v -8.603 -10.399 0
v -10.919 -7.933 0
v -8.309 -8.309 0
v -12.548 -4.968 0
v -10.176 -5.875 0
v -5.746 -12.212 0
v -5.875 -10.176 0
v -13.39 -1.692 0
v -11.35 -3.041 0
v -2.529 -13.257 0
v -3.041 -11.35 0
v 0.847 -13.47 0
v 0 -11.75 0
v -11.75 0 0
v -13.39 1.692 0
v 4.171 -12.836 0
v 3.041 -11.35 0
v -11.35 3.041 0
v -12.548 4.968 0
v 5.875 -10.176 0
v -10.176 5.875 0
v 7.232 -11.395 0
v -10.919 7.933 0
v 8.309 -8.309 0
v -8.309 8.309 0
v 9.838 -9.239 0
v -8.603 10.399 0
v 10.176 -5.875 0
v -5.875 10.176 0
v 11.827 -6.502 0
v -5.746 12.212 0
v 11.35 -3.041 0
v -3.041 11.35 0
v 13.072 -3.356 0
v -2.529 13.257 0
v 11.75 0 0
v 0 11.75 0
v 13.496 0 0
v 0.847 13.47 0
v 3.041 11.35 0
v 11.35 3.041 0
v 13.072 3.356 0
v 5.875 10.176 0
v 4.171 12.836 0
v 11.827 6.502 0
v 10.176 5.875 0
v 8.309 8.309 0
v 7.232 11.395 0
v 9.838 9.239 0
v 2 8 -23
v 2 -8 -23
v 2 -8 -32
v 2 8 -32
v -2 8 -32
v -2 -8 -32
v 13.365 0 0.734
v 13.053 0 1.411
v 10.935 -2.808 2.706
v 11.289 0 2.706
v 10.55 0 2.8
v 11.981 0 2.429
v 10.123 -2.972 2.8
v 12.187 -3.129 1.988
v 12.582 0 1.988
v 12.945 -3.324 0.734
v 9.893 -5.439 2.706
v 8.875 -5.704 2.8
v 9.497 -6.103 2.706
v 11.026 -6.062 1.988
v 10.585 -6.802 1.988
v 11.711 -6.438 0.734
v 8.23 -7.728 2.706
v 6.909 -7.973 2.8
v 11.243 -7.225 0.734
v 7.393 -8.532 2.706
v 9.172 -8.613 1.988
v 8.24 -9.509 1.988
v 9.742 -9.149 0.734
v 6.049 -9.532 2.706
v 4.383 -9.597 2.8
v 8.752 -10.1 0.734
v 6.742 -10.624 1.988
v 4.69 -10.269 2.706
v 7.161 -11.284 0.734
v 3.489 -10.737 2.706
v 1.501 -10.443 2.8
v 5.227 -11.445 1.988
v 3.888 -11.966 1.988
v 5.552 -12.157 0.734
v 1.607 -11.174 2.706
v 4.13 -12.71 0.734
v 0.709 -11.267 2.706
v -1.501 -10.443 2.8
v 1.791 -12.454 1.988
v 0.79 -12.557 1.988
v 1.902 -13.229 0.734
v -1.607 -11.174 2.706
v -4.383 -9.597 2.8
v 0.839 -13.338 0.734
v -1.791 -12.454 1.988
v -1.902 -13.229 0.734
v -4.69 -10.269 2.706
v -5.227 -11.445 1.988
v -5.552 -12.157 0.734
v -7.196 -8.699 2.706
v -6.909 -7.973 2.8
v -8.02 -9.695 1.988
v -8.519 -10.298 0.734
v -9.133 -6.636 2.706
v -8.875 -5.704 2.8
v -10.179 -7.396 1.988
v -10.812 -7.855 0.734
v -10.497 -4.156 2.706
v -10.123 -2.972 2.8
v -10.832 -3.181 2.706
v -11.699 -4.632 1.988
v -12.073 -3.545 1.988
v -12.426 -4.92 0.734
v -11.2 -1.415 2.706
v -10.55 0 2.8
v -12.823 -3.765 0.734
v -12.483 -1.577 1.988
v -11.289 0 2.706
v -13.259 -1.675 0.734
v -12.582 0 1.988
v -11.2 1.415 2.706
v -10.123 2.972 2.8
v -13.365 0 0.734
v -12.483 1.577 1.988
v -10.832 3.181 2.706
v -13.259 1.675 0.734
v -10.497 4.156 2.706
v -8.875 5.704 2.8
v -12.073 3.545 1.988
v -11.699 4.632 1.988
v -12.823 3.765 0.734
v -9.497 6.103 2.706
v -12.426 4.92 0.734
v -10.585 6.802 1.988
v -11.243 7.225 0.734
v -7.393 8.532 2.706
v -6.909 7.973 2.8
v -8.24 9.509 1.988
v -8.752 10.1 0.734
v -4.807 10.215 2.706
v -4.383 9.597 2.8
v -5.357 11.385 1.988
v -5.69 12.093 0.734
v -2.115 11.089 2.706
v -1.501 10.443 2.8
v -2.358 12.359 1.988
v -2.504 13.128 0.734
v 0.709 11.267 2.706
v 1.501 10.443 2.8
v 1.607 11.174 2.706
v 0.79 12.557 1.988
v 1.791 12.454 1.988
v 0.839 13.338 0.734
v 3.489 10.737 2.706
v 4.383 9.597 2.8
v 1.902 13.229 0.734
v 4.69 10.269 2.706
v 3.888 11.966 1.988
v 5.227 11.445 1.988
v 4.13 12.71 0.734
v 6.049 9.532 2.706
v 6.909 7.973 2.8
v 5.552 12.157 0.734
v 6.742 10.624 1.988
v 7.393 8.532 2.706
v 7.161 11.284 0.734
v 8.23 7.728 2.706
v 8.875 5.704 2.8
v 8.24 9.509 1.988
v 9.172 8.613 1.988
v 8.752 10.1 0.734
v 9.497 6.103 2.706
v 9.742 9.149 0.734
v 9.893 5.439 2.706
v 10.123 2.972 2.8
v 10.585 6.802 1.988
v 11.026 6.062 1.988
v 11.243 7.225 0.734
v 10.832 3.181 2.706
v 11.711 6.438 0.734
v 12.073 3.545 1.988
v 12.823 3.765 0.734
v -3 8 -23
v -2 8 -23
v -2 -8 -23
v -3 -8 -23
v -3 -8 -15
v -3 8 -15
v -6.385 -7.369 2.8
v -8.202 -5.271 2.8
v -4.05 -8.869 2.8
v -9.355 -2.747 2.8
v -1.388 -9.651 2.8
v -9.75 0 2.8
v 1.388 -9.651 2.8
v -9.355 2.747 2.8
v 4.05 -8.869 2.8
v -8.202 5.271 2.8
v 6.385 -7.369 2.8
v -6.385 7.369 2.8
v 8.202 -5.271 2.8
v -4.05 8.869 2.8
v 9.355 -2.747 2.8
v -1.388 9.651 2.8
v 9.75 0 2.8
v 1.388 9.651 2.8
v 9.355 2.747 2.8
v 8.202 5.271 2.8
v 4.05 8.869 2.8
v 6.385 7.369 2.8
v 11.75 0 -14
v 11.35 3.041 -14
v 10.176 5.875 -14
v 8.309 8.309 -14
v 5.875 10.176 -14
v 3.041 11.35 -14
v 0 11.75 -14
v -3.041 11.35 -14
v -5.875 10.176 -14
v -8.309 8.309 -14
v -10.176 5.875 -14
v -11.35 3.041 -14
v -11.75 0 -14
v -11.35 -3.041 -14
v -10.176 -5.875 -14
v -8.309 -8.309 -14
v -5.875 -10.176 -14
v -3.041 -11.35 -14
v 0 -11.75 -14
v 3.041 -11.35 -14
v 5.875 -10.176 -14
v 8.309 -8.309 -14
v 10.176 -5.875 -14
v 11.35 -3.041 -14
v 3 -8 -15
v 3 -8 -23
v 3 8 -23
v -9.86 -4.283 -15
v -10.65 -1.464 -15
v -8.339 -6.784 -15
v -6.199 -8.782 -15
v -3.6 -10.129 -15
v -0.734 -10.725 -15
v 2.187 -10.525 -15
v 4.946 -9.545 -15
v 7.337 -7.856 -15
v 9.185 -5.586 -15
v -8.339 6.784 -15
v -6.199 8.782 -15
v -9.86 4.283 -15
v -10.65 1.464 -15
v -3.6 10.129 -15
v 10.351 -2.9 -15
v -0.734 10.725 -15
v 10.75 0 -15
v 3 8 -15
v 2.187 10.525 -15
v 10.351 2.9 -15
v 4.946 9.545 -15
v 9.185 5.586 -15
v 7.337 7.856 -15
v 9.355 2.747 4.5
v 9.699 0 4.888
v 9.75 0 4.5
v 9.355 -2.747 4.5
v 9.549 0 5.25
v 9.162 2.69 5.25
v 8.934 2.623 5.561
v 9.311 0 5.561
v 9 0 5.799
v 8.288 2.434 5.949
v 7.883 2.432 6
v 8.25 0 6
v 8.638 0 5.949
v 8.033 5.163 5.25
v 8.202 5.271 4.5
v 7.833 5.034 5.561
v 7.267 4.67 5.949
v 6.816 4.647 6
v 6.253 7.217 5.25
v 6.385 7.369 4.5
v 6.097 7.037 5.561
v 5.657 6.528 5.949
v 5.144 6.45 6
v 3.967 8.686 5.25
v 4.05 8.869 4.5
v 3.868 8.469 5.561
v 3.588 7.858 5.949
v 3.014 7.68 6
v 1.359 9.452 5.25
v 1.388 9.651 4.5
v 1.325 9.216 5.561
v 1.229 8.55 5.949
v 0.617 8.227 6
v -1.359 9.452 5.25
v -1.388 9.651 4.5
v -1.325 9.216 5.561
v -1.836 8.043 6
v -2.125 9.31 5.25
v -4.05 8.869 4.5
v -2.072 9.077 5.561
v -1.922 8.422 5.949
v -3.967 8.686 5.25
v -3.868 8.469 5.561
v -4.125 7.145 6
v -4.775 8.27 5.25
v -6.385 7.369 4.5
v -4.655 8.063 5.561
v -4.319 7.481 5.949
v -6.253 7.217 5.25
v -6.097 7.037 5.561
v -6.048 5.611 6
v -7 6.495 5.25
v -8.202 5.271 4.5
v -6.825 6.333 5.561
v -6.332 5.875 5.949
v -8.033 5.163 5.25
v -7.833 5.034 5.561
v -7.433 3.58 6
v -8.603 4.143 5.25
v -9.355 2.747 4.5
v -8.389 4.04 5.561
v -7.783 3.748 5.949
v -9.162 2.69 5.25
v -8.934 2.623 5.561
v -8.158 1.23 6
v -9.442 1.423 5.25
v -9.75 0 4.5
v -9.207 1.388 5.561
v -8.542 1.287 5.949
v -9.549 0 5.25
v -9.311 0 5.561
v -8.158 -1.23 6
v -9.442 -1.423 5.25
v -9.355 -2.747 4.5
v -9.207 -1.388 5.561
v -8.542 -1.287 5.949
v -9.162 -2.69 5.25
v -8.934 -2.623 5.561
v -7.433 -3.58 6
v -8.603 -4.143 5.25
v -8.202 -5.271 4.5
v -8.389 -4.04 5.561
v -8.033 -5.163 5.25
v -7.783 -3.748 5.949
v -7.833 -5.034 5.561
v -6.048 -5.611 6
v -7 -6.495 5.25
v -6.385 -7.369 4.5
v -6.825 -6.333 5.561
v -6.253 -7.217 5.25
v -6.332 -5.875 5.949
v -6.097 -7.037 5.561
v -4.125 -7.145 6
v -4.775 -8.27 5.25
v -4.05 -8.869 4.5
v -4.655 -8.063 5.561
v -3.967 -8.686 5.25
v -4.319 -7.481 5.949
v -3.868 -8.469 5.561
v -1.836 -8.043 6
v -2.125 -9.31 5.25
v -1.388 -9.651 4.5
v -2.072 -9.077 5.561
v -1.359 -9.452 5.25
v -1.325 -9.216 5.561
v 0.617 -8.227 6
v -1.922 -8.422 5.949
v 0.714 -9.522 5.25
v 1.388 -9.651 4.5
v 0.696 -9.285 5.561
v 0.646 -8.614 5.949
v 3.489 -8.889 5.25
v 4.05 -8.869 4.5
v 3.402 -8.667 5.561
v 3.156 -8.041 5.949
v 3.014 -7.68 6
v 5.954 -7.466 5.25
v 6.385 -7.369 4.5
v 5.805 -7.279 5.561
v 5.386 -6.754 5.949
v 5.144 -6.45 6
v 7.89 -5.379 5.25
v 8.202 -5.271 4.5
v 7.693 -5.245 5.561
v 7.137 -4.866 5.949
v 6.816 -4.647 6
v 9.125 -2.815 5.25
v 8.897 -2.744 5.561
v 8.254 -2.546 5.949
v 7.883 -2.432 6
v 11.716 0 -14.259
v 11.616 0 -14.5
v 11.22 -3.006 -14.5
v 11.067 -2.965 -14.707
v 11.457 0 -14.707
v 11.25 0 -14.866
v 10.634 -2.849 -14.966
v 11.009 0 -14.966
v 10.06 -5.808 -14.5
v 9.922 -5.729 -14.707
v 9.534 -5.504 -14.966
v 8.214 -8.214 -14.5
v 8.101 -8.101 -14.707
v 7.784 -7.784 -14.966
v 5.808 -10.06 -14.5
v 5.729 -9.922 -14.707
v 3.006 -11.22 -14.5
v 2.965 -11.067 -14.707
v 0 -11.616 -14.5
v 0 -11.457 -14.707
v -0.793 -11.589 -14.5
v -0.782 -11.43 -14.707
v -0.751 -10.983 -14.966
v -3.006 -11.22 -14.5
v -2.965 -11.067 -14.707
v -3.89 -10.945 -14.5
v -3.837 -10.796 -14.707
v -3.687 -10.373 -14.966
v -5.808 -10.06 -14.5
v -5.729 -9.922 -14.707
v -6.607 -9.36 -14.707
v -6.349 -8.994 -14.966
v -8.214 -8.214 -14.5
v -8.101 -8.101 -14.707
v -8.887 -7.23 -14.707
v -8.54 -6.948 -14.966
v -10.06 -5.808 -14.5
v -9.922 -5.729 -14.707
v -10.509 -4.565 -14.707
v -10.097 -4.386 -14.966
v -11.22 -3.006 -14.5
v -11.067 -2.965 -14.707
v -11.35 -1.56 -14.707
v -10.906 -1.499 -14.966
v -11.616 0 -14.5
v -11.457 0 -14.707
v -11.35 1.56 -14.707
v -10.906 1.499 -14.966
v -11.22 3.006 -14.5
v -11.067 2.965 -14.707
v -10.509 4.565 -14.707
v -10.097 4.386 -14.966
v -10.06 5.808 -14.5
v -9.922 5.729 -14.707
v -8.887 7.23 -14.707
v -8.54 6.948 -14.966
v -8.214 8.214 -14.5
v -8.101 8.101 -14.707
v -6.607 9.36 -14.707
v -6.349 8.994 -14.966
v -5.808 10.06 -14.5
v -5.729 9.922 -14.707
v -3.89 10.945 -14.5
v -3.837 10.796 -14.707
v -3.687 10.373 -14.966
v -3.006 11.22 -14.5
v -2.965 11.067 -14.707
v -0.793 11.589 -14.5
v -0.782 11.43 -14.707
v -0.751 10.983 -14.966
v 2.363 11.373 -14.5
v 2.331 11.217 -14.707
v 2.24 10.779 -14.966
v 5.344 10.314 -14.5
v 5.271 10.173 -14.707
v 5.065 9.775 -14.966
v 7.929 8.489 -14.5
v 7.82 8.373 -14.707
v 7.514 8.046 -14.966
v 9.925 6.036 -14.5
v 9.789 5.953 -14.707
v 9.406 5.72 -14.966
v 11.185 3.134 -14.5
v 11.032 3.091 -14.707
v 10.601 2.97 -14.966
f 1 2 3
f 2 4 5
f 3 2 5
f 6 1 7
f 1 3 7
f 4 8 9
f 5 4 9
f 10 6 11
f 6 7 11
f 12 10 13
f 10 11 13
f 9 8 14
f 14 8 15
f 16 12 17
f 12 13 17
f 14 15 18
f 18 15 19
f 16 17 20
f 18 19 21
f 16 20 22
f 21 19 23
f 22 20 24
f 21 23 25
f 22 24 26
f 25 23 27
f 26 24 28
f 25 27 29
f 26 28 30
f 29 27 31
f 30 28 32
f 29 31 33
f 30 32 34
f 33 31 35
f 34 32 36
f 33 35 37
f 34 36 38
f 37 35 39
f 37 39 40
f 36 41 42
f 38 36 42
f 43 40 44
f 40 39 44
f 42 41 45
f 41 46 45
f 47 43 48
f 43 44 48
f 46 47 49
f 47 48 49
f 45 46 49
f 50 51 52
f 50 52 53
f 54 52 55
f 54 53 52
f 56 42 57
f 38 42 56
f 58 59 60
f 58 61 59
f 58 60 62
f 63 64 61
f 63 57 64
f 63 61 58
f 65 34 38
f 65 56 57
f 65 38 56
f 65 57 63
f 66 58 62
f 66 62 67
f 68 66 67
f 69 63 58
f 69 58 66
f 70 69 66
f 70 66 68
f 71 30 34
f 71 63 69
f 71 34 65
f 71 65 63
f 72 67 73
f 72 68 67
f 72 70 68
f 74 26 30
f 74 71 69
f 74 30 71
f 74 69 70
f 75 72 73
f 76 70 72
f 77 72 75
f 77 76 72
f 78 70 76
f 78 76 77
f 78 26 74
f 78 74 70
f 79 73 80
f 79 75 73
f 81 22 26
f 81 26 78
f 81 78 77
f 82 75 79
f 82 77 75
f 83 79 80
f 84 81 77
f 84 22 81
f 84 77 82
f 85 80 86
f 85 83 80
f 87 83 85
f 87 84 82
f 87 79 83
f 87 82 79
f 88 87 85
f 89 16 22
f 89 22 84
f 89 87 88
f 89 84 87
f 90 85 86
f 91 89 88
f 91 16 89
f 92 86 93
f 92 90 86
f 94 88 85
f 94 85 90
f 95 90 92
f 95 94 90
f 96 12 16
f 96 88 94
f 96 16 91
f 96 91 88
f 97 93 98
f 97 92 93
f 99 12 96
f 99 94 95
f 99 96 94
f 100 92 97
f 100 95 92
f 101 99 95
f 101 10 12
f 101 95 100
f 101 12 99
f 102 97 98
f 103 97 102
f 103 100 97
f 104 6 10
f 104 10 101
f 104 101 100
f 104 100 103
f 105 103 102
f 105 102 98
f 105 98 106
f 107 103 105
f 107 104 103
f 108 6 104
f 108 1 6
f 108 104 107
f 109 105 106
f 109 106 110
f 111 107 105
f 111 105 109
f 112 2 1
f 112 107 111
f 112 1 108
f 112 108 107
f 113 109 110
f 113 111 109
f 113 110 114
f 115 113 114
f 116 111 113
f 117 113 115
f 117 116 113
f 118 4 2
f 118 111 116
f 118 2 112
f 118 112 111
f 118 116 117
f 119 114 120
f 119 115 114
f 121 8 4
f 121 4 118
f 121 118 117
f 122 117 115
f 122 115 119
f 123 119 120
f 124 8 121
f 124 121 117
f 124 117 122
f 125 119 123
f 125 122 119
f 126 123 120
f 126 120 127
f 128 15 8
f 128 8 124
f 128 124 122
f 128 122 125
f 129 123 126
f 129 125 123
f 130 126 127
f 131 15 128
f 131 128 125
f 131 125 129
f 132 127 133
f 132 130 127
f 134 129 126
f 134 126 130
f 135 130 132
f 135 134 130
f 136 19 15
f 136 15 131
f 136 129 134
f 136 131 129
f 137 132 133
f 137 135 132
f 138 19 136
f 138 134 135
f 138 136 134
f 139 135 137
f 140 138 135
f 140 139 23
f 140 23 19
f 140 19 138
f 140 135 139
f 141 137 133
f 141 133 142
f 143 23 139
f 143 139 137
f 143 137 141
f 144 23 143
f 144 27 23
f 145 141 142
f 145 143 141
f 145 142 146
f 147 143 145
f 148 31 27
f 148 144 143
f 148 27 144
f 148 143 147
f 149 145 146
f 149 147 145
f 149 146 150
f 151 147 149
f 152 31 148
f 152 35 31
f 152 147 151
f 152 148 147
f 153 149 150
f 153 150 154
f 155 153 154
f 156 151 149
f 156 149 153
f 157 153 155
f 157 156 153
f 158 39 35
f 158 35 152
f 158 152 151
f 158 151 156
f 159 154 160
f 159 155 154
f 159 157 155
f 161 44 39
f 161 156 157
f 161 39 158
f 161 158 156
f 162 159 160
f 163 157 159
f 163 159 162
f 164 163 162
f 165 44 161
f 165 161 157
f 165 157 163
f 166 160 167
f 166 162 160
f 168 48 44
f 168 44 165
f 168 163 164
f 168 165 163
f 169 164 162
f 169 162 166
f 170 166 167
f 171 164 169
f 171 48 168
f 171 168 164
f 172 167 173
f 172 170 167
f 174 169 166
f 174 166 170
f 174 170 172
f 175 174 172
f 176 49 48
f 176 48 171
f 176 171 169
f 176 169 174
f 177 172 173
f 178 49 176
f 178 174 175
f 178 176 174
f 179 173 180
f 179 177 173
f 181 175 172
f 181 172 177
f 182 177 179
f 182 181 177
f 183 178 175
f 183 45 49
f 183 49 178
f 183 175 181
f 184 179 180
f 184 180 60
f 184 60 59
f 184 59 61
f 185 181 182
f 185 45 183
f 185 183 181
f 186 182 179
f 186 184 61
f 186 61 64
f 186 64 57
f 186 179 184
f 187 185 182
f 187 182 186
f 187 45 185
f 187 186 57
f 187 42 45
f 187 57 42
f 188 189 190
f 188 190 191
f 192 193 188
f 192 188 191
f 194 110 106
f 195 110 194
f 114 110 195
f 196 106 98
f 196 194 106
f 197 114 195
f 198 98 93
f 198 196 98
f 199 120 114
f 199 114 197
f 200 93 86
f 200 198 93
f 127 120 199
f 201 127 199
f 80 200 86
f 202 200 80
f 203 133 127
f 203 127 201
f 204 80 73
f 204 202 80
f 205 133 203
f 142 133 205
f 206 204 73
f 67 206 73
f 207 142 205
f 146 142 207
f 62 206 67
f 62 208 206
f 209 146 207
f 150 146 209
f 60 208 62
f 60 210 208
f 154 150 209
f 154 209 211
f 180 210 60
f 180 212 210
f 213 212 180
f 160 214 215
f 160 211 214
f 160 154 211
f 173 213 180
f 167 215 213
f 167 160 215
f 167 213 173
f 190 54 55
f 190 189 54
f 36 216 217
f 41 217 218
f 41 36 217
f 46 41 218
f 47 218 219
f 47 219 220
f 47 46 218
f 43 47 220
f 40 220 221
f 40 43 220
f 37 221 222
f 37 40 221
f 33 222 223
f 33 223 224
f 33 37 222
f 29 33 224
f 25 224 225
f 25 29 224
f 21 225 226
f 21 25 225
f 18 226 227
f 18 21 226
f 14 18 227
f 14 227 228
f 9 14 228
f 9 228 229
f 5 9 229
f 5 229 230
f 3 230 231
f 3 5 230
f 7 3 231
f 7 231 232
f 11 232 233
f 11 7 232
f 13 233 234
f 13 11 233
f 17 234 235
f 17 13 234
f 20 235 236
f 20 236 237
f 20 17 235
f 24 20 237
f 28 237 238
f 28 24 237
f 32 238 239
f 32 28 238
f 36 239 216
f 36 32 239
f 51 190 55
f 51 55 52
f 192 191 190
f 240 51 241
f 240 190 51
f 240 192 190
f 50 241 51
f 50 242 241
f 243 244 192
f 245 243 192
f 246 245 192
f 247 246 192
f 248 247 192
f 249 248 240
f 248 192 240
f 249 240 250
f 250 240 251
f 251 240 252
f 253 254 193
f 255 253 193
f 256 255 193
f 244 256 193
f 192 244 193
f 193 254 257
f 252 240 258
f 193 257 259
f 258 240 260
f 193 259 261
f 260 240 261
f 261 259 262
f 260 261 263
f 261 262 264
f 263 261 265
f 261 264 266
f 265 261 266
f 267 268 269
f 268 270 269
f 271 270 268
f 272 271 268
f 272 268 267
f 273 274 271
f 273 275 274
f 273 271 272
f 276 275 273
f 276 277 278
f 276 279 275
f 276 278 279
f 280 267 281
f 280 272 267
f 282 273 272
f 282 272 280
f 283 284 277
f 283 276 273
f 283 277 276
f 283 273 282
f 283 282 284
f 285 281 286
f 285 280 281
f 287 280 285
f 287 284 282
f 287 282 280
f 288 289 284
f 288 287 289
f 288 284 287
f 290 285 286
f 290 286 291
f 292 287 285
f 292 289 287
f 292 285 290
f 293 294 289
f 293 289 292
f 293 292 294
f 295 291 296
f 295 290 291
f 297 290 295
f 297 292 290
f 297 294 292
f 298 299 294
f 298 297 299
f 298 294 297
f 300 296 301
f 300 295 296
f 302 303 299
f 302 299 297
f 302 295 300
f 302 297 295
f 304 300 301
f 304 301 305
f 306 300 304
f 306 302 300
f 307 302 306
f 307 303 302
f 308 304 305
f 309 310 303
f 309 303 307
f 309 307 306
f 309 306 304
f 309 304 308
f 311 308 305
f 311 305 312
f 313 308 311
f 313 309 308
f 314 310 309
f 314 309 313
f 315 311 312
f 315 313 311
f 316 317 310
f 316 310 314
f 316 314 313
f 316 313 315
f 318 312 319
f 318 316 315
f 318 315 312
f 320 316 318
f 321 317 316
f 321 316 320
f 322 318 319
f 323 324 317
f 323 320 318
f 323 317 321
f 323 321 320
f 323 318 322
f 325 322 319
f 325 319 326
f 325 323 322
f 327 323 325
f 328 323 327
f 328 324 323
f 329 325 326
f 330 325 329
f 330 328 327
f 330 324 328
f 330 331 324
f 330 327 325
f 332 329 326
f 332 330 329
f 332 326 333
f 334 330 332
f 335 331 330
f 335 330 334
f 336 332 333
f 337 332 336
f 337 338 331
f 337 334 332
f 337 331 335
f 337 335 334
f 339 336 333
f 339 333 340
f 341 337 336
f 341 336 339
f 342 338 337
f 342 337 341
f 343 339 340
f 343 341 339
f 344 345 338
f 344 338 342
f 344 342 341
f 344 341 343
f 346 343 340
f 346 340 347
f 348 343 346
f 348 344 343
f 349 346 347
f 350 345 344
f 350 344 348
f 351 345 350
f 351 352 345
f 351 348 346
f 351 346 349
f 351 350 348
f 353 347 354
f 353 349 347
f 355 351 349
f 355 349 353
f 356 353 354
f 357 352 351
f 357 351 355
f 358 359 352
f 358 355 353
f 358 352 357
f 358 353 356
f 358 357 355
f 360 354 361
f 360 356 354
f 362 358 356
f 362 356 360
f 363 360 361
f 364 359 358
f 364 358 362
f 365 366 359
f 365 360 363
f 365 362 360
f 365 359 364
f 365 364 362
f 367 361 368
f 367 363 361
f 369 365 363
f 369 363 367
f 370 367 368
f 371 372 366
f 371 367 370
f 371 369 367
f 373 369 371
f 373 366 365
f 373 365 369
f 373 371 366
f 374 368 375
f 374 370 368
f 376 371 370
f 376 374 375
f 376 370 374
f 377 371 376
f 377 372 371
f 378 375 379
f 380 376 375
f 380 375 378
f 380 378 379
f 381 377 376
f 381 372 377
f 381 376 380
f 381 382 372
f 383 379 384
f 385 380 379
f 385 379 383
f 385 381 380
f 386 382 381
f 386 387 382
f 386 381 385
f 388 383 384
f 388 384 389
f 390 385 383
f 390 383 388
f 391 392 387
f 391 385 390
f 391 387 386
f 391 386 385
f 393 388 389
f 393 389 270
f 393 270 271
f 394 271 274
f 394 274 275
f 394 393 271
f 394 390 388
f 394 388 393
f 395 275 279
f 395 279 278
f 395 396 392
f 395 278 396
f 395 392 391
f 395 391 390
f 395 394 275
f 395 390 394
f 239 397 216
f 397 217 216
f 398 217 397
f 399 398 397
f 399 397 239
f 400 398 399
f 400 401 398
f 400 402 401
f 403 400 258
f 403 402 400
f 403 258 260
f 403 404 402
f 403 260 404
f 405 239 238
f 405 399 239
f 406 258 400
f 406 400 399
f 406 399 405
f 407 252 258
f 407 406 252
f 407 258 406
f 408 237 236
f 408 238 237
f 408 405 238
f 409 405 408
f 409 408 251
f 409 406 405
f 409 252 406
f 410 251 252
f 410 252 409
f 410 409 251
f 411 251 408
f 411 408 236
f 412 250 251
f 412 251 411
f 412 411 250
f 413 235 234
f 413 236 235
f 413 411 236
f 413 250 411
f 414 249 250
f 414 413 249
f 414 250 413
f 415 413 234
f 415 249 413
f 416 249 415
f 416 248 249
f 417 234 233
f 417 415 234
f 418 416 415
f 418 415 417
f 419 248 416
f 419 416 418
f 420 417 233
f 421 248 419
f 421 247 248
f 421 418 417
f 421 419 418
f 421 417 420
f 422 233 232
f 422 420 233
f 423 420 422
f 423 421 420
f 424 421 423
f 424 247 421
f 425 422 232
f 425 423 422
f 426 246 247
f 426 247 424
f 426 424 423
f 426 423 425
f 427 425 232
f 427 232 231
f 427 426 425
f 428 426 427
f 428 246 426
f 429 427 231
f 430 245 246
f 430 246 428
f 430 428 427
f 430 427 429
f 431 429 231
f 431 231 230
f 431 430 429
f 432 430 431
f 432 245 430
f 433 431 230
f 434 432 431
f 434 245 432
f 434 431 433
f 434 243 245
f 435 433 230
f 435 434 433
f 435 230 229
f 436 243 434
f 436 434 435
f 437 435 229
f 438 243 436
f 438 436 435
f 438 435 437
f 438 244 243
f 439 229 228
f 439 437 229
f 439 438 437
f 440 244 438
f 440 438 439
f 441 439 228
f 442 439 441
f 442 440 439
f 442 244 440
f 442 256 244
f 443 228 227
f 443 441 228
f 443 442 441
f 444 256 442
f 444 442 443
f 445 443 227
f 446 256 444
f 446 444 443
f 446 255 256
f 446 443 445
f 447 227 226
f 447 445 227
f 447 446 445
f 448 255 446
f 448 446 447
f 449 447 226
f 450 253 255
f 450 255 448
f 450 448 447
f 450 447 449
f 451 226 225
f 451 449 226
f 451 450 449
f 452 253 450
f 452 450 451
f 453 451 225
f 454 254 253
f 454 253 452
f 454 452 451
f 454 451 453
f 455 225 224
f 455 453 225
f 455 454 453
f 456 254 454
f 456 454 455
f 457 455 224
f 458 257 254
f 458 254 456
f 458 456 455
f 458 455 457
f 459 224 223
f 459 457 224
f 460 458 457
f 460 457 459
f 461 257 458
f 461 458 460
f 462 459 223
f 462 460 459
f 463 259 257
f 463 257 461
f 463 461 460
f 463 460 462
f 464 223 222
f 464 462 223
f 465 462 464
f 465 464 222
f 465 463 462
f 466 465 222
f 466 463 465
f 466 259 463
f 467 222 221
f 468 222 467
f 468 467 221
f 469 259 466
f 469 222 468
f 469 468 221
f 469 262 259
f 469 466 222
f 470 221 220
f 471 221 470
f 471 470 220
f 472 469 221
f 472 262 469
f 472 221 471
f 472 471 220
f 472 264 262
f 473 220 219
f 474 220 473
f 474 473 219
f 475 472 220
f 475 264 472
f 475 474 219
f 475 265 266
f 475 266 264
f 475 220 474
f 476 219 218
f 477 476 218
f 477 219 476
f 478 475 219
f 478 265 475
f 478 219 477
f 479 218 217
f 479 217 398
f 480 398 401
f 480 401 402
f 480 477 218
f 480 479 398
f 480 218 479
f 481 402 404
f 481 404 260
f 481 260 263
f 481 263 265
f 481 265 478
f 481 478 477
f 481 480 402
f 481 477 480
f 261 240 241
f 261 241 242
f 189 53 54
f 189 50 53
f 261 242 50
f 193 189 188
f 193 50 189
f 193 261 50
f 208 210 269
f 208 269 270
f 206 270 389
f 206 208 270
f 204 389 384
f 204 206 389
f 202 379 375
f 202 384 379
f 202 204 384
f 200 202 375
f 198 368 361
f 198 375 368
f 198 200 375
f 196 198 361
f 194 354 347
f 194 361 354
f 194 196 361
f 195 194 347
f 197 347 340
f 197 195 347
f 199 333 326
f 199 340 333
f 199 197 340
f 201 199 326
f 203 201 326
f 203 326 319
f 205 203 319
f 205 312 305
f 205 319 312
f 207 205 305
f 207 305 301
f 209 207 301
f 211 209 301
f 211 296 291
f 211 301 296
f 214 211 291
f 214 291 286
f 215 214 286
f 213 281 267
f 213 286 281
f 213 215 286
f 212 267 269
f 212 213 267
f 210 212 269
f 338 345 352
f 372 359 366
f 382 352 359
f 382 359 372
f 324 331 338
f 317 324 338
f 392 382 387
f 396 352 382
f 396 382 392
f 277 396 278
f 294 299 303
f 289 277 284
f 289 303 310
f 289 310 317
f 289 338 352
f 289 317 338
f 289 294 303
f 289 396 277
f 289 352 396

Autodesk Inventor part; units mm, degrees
ref_plane "YZ Plane" through (0, 0, 0) normal (1, 0, 0) x (0, 1, 0)
ref_plane "XZ Plane" through (0, 0, 0) normal (0, 1, 0) x (-1, 0, 0)
ref_plane "XY Plane" through (0, 0, 0) normal (0, 0, 1) x (1, 0, 0)
sketch "Sketch1" plane through (0, 0, 0) normal (0, 0, 1) x (1, 0, 0)
  circle A0 centre (0, 0) radius 11.75
  dimension "d0" = 23.5
extrude "Extrusion1" add sketch "Sketch1" against normal blind 15
sketch "Sketch2" plane through (0, 0, 0) normal (0, 0, 1) x (1, 0, 0)
  circle A0 centre (0, 0) radius 11.75 projected
  circle A1 centre (0, 0) radius 13.5
  dimension "d3" = 27
extrude "Extrusion2" add sketch "Sketch2" along normal blind 2.8 contours A0 | A1
sketch "Sketch3" plane through (0, 0, 2.8) normal (0, 0, 1) x (1, 0, 0)
  circle A0 centre (0, 0) radius 13.5 projected
  circle A1 centre (0, 0) radius 9.75
  dimension "d8" = 19.5
extrude "Extrusion3" add sketch "Sketch3" along normal blind 3.2 contours A1
fillet "Fillet1" radius 1.5 1 edges at (-9.75, 0, 6)
fillet "Fillet2" radius 2.95 1 edges at (-13.5, 0, 2.8)
fillet "Fillet3" radius 1 1 edges at (-11.75, 0, -15)
sketch "Sketch4" plane through (0, 0, -15) normal (0, 0, -1) x (-1, 0, 0)
  circle A0 centre (0, 0) radius 10.75 projected
  line L0 (-3, 8) -> (3, 8)
  line L1 (3, 8) -> (3, -8)
  line L2 (3, -8) -> (-3, -8)
  line L3 (-3, -8) -> (-3, 8)
  point P0 (3, 0)
  point P1 (0, 8)
  dimension "d14" = 6
  dimension "d16" = 16
extrude "Extrusion4" add sketch "Sketch4" along normal blind 8 contours L0 L1 L2 L3
sketch "Sketch5" plane through (0, 0, -23) normal (0, 0, -1) x (-1, 0, 0)
  line L0 (3, 8) -> (-3, 8) projected
  line L1 (3, -8) -> (3, 8) projected
  line L2 (-2, 8) -> (2, 8)
  line L3 (2, 8) -> (2, -8)
  line L4 (2, -8) -> (-2, -8)
  line L5 (-2, -8) -> (-2, 8)
  point P0 (0, 0)
  point P1 (2, 0)
  point P2 (3, 0)
  point P3 (0, 8)
  point P4 (0, 8)
  dimension "d19" = 4
  dimension "d21" = 16
extrude "Extrusion5" add sketch "Sketch5" along normal blind 9
properties part number "OBSF-24_button" material "Nylon 6"
